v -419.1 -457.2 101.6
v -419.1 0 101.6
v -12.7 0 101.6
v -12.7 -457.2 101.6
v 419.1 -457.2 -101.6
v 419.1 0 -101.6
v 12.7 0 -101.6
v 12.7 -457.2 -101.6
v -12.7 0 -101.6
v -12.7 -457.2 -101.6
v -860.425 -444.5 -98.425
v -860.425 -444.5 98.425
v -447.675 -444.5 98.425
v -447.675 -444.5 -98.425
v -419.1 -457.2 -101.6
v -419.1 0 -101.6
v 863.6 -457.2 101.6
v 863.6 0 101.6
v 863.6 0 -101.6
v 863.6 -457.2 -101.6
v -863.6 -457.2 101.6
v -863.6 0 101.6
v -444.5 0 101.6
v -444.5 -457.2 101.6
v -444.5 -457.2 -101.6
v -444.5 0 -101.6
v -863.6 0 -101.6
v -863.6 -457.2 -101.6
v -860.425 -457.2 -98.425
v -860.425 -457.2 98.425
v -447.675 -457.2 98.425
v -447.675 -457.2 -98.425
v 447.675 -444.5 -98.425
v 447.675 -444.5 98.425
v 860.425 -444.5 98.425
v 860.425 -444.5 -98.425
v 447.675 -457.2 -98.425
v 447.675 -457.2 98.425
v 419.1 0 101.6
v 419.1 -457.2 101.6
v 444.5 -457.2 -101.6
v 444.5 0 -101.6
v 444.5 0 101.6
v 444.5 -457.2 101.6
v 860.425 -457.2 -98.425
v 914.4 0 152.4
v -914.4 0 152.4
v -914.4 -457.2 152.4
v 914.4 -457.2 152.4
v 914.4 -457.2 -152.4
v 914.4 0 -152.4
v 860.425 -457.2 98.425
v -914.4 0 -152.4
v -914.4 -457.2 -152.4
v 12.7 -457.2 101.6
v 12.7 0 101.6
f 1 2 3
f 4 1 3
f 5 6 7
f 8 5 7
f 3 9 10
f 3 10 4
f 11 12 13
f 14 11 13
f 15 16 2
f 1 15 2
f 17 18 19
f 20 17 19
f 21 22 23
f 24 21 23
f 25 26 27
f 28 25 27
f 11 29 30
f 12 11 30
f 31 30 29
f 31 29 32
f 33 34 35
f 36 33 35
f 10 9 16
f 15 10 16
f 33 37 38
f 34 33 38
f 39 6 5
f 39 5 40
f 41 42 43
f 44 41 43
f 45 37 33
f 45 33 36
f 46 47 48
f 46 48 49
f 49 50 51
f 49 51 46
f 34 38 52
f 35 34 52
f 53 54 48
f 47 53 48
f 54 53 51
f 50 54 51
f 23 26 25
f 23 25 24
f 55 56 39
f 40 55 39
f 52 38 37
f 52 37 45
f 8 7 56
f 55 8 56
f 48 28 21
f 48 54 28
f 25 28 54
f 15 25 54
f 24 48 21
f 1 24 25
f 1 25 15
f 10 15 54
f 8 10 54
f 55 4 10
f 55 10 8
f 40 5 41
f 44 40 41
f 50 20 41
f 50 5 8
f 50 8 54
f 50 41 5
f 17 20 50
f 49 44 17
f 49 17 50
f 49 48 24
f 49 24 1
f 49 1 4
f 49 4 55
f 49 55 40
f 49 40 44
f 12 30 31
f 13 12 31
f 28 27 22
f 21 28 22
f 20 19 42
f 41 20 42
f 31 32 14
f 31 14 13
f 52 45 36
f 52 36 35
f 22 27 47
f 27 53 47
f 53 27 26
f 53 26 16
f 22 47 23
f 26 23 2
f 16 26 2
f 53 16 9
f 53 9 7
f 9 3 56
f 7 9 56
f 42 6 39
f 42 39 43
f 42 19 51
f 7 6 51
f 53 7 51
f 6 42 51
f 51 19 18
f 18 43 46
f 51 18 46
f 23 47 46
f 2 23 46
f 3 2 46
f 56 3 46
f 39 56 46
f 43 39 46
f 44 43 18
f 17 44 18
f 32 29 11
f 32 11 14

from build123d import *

# Parameters (mm, degrees)
F0_W     = 1828.8
F0_H     = 304.8
F0_W_2   = 25.4
F0_H_2   = 203.2
F1_DEPTH = 457.2
F2_W     = 412.75
F2_H     = 196.85
F3_DEPTH = 12.7
F4_DEPTH = 12.7


with BuildPart() as f1:
    # F0 (on Front) → F1 (new body)
    with BuildSketch(Plane.XZ):
        Rectangle(F0_W, F0_H)
        Polygon((-444.5, -101.6), (-863.6, -101.6), (-863.6, 101.6), (-444.5, 101.6), (-419.1, 101.6), (-12.7, 101.6), (12.7, 101.6), (419.1, 101.6), (444.5, 101.6), (863.6, 101.6), (863.6, -101.6), (444.5, -101.6), (419.1, -101.6), (12.7, -101.6), (-12.7, -101.6), (-419.1, -101.6), align=None, mode=Mode.SUBTRACT)
        with Locations((-431.8, 0)):
            Rectangle(F0_W_2, F0_H_2)
        Rectangle(F0_W_2, F0_H_2)
        with Locations((431.8, 0)):
            Rectangle(F0_W_2, F0_H_2)
    extrude(amount=F1_DEPTH)


with BuildPart() as f3:
    # F2 (on face) → F3 (new body)
    with BuildSketch(Plane.XZ.offset(457.2)):
        with Locations((-654.05, 0)):
            Rectangle(F2_W, F2_H)
    extrude(amount=-F3_DEPTH)

    # F2 (on face) → F4 (join)
    with BuildSketch(Plane.XZ.offset(457.2)):
        with Locations((-654.05, 0)):
            Rectangle(F2_W, F2_H)
        with Locations((654.05, 0)):
            Rectangle(F2_W, F2_H)
    extrude(amount=-F4_DEPTH)


solid = Compound([f1.part, f3.part])
